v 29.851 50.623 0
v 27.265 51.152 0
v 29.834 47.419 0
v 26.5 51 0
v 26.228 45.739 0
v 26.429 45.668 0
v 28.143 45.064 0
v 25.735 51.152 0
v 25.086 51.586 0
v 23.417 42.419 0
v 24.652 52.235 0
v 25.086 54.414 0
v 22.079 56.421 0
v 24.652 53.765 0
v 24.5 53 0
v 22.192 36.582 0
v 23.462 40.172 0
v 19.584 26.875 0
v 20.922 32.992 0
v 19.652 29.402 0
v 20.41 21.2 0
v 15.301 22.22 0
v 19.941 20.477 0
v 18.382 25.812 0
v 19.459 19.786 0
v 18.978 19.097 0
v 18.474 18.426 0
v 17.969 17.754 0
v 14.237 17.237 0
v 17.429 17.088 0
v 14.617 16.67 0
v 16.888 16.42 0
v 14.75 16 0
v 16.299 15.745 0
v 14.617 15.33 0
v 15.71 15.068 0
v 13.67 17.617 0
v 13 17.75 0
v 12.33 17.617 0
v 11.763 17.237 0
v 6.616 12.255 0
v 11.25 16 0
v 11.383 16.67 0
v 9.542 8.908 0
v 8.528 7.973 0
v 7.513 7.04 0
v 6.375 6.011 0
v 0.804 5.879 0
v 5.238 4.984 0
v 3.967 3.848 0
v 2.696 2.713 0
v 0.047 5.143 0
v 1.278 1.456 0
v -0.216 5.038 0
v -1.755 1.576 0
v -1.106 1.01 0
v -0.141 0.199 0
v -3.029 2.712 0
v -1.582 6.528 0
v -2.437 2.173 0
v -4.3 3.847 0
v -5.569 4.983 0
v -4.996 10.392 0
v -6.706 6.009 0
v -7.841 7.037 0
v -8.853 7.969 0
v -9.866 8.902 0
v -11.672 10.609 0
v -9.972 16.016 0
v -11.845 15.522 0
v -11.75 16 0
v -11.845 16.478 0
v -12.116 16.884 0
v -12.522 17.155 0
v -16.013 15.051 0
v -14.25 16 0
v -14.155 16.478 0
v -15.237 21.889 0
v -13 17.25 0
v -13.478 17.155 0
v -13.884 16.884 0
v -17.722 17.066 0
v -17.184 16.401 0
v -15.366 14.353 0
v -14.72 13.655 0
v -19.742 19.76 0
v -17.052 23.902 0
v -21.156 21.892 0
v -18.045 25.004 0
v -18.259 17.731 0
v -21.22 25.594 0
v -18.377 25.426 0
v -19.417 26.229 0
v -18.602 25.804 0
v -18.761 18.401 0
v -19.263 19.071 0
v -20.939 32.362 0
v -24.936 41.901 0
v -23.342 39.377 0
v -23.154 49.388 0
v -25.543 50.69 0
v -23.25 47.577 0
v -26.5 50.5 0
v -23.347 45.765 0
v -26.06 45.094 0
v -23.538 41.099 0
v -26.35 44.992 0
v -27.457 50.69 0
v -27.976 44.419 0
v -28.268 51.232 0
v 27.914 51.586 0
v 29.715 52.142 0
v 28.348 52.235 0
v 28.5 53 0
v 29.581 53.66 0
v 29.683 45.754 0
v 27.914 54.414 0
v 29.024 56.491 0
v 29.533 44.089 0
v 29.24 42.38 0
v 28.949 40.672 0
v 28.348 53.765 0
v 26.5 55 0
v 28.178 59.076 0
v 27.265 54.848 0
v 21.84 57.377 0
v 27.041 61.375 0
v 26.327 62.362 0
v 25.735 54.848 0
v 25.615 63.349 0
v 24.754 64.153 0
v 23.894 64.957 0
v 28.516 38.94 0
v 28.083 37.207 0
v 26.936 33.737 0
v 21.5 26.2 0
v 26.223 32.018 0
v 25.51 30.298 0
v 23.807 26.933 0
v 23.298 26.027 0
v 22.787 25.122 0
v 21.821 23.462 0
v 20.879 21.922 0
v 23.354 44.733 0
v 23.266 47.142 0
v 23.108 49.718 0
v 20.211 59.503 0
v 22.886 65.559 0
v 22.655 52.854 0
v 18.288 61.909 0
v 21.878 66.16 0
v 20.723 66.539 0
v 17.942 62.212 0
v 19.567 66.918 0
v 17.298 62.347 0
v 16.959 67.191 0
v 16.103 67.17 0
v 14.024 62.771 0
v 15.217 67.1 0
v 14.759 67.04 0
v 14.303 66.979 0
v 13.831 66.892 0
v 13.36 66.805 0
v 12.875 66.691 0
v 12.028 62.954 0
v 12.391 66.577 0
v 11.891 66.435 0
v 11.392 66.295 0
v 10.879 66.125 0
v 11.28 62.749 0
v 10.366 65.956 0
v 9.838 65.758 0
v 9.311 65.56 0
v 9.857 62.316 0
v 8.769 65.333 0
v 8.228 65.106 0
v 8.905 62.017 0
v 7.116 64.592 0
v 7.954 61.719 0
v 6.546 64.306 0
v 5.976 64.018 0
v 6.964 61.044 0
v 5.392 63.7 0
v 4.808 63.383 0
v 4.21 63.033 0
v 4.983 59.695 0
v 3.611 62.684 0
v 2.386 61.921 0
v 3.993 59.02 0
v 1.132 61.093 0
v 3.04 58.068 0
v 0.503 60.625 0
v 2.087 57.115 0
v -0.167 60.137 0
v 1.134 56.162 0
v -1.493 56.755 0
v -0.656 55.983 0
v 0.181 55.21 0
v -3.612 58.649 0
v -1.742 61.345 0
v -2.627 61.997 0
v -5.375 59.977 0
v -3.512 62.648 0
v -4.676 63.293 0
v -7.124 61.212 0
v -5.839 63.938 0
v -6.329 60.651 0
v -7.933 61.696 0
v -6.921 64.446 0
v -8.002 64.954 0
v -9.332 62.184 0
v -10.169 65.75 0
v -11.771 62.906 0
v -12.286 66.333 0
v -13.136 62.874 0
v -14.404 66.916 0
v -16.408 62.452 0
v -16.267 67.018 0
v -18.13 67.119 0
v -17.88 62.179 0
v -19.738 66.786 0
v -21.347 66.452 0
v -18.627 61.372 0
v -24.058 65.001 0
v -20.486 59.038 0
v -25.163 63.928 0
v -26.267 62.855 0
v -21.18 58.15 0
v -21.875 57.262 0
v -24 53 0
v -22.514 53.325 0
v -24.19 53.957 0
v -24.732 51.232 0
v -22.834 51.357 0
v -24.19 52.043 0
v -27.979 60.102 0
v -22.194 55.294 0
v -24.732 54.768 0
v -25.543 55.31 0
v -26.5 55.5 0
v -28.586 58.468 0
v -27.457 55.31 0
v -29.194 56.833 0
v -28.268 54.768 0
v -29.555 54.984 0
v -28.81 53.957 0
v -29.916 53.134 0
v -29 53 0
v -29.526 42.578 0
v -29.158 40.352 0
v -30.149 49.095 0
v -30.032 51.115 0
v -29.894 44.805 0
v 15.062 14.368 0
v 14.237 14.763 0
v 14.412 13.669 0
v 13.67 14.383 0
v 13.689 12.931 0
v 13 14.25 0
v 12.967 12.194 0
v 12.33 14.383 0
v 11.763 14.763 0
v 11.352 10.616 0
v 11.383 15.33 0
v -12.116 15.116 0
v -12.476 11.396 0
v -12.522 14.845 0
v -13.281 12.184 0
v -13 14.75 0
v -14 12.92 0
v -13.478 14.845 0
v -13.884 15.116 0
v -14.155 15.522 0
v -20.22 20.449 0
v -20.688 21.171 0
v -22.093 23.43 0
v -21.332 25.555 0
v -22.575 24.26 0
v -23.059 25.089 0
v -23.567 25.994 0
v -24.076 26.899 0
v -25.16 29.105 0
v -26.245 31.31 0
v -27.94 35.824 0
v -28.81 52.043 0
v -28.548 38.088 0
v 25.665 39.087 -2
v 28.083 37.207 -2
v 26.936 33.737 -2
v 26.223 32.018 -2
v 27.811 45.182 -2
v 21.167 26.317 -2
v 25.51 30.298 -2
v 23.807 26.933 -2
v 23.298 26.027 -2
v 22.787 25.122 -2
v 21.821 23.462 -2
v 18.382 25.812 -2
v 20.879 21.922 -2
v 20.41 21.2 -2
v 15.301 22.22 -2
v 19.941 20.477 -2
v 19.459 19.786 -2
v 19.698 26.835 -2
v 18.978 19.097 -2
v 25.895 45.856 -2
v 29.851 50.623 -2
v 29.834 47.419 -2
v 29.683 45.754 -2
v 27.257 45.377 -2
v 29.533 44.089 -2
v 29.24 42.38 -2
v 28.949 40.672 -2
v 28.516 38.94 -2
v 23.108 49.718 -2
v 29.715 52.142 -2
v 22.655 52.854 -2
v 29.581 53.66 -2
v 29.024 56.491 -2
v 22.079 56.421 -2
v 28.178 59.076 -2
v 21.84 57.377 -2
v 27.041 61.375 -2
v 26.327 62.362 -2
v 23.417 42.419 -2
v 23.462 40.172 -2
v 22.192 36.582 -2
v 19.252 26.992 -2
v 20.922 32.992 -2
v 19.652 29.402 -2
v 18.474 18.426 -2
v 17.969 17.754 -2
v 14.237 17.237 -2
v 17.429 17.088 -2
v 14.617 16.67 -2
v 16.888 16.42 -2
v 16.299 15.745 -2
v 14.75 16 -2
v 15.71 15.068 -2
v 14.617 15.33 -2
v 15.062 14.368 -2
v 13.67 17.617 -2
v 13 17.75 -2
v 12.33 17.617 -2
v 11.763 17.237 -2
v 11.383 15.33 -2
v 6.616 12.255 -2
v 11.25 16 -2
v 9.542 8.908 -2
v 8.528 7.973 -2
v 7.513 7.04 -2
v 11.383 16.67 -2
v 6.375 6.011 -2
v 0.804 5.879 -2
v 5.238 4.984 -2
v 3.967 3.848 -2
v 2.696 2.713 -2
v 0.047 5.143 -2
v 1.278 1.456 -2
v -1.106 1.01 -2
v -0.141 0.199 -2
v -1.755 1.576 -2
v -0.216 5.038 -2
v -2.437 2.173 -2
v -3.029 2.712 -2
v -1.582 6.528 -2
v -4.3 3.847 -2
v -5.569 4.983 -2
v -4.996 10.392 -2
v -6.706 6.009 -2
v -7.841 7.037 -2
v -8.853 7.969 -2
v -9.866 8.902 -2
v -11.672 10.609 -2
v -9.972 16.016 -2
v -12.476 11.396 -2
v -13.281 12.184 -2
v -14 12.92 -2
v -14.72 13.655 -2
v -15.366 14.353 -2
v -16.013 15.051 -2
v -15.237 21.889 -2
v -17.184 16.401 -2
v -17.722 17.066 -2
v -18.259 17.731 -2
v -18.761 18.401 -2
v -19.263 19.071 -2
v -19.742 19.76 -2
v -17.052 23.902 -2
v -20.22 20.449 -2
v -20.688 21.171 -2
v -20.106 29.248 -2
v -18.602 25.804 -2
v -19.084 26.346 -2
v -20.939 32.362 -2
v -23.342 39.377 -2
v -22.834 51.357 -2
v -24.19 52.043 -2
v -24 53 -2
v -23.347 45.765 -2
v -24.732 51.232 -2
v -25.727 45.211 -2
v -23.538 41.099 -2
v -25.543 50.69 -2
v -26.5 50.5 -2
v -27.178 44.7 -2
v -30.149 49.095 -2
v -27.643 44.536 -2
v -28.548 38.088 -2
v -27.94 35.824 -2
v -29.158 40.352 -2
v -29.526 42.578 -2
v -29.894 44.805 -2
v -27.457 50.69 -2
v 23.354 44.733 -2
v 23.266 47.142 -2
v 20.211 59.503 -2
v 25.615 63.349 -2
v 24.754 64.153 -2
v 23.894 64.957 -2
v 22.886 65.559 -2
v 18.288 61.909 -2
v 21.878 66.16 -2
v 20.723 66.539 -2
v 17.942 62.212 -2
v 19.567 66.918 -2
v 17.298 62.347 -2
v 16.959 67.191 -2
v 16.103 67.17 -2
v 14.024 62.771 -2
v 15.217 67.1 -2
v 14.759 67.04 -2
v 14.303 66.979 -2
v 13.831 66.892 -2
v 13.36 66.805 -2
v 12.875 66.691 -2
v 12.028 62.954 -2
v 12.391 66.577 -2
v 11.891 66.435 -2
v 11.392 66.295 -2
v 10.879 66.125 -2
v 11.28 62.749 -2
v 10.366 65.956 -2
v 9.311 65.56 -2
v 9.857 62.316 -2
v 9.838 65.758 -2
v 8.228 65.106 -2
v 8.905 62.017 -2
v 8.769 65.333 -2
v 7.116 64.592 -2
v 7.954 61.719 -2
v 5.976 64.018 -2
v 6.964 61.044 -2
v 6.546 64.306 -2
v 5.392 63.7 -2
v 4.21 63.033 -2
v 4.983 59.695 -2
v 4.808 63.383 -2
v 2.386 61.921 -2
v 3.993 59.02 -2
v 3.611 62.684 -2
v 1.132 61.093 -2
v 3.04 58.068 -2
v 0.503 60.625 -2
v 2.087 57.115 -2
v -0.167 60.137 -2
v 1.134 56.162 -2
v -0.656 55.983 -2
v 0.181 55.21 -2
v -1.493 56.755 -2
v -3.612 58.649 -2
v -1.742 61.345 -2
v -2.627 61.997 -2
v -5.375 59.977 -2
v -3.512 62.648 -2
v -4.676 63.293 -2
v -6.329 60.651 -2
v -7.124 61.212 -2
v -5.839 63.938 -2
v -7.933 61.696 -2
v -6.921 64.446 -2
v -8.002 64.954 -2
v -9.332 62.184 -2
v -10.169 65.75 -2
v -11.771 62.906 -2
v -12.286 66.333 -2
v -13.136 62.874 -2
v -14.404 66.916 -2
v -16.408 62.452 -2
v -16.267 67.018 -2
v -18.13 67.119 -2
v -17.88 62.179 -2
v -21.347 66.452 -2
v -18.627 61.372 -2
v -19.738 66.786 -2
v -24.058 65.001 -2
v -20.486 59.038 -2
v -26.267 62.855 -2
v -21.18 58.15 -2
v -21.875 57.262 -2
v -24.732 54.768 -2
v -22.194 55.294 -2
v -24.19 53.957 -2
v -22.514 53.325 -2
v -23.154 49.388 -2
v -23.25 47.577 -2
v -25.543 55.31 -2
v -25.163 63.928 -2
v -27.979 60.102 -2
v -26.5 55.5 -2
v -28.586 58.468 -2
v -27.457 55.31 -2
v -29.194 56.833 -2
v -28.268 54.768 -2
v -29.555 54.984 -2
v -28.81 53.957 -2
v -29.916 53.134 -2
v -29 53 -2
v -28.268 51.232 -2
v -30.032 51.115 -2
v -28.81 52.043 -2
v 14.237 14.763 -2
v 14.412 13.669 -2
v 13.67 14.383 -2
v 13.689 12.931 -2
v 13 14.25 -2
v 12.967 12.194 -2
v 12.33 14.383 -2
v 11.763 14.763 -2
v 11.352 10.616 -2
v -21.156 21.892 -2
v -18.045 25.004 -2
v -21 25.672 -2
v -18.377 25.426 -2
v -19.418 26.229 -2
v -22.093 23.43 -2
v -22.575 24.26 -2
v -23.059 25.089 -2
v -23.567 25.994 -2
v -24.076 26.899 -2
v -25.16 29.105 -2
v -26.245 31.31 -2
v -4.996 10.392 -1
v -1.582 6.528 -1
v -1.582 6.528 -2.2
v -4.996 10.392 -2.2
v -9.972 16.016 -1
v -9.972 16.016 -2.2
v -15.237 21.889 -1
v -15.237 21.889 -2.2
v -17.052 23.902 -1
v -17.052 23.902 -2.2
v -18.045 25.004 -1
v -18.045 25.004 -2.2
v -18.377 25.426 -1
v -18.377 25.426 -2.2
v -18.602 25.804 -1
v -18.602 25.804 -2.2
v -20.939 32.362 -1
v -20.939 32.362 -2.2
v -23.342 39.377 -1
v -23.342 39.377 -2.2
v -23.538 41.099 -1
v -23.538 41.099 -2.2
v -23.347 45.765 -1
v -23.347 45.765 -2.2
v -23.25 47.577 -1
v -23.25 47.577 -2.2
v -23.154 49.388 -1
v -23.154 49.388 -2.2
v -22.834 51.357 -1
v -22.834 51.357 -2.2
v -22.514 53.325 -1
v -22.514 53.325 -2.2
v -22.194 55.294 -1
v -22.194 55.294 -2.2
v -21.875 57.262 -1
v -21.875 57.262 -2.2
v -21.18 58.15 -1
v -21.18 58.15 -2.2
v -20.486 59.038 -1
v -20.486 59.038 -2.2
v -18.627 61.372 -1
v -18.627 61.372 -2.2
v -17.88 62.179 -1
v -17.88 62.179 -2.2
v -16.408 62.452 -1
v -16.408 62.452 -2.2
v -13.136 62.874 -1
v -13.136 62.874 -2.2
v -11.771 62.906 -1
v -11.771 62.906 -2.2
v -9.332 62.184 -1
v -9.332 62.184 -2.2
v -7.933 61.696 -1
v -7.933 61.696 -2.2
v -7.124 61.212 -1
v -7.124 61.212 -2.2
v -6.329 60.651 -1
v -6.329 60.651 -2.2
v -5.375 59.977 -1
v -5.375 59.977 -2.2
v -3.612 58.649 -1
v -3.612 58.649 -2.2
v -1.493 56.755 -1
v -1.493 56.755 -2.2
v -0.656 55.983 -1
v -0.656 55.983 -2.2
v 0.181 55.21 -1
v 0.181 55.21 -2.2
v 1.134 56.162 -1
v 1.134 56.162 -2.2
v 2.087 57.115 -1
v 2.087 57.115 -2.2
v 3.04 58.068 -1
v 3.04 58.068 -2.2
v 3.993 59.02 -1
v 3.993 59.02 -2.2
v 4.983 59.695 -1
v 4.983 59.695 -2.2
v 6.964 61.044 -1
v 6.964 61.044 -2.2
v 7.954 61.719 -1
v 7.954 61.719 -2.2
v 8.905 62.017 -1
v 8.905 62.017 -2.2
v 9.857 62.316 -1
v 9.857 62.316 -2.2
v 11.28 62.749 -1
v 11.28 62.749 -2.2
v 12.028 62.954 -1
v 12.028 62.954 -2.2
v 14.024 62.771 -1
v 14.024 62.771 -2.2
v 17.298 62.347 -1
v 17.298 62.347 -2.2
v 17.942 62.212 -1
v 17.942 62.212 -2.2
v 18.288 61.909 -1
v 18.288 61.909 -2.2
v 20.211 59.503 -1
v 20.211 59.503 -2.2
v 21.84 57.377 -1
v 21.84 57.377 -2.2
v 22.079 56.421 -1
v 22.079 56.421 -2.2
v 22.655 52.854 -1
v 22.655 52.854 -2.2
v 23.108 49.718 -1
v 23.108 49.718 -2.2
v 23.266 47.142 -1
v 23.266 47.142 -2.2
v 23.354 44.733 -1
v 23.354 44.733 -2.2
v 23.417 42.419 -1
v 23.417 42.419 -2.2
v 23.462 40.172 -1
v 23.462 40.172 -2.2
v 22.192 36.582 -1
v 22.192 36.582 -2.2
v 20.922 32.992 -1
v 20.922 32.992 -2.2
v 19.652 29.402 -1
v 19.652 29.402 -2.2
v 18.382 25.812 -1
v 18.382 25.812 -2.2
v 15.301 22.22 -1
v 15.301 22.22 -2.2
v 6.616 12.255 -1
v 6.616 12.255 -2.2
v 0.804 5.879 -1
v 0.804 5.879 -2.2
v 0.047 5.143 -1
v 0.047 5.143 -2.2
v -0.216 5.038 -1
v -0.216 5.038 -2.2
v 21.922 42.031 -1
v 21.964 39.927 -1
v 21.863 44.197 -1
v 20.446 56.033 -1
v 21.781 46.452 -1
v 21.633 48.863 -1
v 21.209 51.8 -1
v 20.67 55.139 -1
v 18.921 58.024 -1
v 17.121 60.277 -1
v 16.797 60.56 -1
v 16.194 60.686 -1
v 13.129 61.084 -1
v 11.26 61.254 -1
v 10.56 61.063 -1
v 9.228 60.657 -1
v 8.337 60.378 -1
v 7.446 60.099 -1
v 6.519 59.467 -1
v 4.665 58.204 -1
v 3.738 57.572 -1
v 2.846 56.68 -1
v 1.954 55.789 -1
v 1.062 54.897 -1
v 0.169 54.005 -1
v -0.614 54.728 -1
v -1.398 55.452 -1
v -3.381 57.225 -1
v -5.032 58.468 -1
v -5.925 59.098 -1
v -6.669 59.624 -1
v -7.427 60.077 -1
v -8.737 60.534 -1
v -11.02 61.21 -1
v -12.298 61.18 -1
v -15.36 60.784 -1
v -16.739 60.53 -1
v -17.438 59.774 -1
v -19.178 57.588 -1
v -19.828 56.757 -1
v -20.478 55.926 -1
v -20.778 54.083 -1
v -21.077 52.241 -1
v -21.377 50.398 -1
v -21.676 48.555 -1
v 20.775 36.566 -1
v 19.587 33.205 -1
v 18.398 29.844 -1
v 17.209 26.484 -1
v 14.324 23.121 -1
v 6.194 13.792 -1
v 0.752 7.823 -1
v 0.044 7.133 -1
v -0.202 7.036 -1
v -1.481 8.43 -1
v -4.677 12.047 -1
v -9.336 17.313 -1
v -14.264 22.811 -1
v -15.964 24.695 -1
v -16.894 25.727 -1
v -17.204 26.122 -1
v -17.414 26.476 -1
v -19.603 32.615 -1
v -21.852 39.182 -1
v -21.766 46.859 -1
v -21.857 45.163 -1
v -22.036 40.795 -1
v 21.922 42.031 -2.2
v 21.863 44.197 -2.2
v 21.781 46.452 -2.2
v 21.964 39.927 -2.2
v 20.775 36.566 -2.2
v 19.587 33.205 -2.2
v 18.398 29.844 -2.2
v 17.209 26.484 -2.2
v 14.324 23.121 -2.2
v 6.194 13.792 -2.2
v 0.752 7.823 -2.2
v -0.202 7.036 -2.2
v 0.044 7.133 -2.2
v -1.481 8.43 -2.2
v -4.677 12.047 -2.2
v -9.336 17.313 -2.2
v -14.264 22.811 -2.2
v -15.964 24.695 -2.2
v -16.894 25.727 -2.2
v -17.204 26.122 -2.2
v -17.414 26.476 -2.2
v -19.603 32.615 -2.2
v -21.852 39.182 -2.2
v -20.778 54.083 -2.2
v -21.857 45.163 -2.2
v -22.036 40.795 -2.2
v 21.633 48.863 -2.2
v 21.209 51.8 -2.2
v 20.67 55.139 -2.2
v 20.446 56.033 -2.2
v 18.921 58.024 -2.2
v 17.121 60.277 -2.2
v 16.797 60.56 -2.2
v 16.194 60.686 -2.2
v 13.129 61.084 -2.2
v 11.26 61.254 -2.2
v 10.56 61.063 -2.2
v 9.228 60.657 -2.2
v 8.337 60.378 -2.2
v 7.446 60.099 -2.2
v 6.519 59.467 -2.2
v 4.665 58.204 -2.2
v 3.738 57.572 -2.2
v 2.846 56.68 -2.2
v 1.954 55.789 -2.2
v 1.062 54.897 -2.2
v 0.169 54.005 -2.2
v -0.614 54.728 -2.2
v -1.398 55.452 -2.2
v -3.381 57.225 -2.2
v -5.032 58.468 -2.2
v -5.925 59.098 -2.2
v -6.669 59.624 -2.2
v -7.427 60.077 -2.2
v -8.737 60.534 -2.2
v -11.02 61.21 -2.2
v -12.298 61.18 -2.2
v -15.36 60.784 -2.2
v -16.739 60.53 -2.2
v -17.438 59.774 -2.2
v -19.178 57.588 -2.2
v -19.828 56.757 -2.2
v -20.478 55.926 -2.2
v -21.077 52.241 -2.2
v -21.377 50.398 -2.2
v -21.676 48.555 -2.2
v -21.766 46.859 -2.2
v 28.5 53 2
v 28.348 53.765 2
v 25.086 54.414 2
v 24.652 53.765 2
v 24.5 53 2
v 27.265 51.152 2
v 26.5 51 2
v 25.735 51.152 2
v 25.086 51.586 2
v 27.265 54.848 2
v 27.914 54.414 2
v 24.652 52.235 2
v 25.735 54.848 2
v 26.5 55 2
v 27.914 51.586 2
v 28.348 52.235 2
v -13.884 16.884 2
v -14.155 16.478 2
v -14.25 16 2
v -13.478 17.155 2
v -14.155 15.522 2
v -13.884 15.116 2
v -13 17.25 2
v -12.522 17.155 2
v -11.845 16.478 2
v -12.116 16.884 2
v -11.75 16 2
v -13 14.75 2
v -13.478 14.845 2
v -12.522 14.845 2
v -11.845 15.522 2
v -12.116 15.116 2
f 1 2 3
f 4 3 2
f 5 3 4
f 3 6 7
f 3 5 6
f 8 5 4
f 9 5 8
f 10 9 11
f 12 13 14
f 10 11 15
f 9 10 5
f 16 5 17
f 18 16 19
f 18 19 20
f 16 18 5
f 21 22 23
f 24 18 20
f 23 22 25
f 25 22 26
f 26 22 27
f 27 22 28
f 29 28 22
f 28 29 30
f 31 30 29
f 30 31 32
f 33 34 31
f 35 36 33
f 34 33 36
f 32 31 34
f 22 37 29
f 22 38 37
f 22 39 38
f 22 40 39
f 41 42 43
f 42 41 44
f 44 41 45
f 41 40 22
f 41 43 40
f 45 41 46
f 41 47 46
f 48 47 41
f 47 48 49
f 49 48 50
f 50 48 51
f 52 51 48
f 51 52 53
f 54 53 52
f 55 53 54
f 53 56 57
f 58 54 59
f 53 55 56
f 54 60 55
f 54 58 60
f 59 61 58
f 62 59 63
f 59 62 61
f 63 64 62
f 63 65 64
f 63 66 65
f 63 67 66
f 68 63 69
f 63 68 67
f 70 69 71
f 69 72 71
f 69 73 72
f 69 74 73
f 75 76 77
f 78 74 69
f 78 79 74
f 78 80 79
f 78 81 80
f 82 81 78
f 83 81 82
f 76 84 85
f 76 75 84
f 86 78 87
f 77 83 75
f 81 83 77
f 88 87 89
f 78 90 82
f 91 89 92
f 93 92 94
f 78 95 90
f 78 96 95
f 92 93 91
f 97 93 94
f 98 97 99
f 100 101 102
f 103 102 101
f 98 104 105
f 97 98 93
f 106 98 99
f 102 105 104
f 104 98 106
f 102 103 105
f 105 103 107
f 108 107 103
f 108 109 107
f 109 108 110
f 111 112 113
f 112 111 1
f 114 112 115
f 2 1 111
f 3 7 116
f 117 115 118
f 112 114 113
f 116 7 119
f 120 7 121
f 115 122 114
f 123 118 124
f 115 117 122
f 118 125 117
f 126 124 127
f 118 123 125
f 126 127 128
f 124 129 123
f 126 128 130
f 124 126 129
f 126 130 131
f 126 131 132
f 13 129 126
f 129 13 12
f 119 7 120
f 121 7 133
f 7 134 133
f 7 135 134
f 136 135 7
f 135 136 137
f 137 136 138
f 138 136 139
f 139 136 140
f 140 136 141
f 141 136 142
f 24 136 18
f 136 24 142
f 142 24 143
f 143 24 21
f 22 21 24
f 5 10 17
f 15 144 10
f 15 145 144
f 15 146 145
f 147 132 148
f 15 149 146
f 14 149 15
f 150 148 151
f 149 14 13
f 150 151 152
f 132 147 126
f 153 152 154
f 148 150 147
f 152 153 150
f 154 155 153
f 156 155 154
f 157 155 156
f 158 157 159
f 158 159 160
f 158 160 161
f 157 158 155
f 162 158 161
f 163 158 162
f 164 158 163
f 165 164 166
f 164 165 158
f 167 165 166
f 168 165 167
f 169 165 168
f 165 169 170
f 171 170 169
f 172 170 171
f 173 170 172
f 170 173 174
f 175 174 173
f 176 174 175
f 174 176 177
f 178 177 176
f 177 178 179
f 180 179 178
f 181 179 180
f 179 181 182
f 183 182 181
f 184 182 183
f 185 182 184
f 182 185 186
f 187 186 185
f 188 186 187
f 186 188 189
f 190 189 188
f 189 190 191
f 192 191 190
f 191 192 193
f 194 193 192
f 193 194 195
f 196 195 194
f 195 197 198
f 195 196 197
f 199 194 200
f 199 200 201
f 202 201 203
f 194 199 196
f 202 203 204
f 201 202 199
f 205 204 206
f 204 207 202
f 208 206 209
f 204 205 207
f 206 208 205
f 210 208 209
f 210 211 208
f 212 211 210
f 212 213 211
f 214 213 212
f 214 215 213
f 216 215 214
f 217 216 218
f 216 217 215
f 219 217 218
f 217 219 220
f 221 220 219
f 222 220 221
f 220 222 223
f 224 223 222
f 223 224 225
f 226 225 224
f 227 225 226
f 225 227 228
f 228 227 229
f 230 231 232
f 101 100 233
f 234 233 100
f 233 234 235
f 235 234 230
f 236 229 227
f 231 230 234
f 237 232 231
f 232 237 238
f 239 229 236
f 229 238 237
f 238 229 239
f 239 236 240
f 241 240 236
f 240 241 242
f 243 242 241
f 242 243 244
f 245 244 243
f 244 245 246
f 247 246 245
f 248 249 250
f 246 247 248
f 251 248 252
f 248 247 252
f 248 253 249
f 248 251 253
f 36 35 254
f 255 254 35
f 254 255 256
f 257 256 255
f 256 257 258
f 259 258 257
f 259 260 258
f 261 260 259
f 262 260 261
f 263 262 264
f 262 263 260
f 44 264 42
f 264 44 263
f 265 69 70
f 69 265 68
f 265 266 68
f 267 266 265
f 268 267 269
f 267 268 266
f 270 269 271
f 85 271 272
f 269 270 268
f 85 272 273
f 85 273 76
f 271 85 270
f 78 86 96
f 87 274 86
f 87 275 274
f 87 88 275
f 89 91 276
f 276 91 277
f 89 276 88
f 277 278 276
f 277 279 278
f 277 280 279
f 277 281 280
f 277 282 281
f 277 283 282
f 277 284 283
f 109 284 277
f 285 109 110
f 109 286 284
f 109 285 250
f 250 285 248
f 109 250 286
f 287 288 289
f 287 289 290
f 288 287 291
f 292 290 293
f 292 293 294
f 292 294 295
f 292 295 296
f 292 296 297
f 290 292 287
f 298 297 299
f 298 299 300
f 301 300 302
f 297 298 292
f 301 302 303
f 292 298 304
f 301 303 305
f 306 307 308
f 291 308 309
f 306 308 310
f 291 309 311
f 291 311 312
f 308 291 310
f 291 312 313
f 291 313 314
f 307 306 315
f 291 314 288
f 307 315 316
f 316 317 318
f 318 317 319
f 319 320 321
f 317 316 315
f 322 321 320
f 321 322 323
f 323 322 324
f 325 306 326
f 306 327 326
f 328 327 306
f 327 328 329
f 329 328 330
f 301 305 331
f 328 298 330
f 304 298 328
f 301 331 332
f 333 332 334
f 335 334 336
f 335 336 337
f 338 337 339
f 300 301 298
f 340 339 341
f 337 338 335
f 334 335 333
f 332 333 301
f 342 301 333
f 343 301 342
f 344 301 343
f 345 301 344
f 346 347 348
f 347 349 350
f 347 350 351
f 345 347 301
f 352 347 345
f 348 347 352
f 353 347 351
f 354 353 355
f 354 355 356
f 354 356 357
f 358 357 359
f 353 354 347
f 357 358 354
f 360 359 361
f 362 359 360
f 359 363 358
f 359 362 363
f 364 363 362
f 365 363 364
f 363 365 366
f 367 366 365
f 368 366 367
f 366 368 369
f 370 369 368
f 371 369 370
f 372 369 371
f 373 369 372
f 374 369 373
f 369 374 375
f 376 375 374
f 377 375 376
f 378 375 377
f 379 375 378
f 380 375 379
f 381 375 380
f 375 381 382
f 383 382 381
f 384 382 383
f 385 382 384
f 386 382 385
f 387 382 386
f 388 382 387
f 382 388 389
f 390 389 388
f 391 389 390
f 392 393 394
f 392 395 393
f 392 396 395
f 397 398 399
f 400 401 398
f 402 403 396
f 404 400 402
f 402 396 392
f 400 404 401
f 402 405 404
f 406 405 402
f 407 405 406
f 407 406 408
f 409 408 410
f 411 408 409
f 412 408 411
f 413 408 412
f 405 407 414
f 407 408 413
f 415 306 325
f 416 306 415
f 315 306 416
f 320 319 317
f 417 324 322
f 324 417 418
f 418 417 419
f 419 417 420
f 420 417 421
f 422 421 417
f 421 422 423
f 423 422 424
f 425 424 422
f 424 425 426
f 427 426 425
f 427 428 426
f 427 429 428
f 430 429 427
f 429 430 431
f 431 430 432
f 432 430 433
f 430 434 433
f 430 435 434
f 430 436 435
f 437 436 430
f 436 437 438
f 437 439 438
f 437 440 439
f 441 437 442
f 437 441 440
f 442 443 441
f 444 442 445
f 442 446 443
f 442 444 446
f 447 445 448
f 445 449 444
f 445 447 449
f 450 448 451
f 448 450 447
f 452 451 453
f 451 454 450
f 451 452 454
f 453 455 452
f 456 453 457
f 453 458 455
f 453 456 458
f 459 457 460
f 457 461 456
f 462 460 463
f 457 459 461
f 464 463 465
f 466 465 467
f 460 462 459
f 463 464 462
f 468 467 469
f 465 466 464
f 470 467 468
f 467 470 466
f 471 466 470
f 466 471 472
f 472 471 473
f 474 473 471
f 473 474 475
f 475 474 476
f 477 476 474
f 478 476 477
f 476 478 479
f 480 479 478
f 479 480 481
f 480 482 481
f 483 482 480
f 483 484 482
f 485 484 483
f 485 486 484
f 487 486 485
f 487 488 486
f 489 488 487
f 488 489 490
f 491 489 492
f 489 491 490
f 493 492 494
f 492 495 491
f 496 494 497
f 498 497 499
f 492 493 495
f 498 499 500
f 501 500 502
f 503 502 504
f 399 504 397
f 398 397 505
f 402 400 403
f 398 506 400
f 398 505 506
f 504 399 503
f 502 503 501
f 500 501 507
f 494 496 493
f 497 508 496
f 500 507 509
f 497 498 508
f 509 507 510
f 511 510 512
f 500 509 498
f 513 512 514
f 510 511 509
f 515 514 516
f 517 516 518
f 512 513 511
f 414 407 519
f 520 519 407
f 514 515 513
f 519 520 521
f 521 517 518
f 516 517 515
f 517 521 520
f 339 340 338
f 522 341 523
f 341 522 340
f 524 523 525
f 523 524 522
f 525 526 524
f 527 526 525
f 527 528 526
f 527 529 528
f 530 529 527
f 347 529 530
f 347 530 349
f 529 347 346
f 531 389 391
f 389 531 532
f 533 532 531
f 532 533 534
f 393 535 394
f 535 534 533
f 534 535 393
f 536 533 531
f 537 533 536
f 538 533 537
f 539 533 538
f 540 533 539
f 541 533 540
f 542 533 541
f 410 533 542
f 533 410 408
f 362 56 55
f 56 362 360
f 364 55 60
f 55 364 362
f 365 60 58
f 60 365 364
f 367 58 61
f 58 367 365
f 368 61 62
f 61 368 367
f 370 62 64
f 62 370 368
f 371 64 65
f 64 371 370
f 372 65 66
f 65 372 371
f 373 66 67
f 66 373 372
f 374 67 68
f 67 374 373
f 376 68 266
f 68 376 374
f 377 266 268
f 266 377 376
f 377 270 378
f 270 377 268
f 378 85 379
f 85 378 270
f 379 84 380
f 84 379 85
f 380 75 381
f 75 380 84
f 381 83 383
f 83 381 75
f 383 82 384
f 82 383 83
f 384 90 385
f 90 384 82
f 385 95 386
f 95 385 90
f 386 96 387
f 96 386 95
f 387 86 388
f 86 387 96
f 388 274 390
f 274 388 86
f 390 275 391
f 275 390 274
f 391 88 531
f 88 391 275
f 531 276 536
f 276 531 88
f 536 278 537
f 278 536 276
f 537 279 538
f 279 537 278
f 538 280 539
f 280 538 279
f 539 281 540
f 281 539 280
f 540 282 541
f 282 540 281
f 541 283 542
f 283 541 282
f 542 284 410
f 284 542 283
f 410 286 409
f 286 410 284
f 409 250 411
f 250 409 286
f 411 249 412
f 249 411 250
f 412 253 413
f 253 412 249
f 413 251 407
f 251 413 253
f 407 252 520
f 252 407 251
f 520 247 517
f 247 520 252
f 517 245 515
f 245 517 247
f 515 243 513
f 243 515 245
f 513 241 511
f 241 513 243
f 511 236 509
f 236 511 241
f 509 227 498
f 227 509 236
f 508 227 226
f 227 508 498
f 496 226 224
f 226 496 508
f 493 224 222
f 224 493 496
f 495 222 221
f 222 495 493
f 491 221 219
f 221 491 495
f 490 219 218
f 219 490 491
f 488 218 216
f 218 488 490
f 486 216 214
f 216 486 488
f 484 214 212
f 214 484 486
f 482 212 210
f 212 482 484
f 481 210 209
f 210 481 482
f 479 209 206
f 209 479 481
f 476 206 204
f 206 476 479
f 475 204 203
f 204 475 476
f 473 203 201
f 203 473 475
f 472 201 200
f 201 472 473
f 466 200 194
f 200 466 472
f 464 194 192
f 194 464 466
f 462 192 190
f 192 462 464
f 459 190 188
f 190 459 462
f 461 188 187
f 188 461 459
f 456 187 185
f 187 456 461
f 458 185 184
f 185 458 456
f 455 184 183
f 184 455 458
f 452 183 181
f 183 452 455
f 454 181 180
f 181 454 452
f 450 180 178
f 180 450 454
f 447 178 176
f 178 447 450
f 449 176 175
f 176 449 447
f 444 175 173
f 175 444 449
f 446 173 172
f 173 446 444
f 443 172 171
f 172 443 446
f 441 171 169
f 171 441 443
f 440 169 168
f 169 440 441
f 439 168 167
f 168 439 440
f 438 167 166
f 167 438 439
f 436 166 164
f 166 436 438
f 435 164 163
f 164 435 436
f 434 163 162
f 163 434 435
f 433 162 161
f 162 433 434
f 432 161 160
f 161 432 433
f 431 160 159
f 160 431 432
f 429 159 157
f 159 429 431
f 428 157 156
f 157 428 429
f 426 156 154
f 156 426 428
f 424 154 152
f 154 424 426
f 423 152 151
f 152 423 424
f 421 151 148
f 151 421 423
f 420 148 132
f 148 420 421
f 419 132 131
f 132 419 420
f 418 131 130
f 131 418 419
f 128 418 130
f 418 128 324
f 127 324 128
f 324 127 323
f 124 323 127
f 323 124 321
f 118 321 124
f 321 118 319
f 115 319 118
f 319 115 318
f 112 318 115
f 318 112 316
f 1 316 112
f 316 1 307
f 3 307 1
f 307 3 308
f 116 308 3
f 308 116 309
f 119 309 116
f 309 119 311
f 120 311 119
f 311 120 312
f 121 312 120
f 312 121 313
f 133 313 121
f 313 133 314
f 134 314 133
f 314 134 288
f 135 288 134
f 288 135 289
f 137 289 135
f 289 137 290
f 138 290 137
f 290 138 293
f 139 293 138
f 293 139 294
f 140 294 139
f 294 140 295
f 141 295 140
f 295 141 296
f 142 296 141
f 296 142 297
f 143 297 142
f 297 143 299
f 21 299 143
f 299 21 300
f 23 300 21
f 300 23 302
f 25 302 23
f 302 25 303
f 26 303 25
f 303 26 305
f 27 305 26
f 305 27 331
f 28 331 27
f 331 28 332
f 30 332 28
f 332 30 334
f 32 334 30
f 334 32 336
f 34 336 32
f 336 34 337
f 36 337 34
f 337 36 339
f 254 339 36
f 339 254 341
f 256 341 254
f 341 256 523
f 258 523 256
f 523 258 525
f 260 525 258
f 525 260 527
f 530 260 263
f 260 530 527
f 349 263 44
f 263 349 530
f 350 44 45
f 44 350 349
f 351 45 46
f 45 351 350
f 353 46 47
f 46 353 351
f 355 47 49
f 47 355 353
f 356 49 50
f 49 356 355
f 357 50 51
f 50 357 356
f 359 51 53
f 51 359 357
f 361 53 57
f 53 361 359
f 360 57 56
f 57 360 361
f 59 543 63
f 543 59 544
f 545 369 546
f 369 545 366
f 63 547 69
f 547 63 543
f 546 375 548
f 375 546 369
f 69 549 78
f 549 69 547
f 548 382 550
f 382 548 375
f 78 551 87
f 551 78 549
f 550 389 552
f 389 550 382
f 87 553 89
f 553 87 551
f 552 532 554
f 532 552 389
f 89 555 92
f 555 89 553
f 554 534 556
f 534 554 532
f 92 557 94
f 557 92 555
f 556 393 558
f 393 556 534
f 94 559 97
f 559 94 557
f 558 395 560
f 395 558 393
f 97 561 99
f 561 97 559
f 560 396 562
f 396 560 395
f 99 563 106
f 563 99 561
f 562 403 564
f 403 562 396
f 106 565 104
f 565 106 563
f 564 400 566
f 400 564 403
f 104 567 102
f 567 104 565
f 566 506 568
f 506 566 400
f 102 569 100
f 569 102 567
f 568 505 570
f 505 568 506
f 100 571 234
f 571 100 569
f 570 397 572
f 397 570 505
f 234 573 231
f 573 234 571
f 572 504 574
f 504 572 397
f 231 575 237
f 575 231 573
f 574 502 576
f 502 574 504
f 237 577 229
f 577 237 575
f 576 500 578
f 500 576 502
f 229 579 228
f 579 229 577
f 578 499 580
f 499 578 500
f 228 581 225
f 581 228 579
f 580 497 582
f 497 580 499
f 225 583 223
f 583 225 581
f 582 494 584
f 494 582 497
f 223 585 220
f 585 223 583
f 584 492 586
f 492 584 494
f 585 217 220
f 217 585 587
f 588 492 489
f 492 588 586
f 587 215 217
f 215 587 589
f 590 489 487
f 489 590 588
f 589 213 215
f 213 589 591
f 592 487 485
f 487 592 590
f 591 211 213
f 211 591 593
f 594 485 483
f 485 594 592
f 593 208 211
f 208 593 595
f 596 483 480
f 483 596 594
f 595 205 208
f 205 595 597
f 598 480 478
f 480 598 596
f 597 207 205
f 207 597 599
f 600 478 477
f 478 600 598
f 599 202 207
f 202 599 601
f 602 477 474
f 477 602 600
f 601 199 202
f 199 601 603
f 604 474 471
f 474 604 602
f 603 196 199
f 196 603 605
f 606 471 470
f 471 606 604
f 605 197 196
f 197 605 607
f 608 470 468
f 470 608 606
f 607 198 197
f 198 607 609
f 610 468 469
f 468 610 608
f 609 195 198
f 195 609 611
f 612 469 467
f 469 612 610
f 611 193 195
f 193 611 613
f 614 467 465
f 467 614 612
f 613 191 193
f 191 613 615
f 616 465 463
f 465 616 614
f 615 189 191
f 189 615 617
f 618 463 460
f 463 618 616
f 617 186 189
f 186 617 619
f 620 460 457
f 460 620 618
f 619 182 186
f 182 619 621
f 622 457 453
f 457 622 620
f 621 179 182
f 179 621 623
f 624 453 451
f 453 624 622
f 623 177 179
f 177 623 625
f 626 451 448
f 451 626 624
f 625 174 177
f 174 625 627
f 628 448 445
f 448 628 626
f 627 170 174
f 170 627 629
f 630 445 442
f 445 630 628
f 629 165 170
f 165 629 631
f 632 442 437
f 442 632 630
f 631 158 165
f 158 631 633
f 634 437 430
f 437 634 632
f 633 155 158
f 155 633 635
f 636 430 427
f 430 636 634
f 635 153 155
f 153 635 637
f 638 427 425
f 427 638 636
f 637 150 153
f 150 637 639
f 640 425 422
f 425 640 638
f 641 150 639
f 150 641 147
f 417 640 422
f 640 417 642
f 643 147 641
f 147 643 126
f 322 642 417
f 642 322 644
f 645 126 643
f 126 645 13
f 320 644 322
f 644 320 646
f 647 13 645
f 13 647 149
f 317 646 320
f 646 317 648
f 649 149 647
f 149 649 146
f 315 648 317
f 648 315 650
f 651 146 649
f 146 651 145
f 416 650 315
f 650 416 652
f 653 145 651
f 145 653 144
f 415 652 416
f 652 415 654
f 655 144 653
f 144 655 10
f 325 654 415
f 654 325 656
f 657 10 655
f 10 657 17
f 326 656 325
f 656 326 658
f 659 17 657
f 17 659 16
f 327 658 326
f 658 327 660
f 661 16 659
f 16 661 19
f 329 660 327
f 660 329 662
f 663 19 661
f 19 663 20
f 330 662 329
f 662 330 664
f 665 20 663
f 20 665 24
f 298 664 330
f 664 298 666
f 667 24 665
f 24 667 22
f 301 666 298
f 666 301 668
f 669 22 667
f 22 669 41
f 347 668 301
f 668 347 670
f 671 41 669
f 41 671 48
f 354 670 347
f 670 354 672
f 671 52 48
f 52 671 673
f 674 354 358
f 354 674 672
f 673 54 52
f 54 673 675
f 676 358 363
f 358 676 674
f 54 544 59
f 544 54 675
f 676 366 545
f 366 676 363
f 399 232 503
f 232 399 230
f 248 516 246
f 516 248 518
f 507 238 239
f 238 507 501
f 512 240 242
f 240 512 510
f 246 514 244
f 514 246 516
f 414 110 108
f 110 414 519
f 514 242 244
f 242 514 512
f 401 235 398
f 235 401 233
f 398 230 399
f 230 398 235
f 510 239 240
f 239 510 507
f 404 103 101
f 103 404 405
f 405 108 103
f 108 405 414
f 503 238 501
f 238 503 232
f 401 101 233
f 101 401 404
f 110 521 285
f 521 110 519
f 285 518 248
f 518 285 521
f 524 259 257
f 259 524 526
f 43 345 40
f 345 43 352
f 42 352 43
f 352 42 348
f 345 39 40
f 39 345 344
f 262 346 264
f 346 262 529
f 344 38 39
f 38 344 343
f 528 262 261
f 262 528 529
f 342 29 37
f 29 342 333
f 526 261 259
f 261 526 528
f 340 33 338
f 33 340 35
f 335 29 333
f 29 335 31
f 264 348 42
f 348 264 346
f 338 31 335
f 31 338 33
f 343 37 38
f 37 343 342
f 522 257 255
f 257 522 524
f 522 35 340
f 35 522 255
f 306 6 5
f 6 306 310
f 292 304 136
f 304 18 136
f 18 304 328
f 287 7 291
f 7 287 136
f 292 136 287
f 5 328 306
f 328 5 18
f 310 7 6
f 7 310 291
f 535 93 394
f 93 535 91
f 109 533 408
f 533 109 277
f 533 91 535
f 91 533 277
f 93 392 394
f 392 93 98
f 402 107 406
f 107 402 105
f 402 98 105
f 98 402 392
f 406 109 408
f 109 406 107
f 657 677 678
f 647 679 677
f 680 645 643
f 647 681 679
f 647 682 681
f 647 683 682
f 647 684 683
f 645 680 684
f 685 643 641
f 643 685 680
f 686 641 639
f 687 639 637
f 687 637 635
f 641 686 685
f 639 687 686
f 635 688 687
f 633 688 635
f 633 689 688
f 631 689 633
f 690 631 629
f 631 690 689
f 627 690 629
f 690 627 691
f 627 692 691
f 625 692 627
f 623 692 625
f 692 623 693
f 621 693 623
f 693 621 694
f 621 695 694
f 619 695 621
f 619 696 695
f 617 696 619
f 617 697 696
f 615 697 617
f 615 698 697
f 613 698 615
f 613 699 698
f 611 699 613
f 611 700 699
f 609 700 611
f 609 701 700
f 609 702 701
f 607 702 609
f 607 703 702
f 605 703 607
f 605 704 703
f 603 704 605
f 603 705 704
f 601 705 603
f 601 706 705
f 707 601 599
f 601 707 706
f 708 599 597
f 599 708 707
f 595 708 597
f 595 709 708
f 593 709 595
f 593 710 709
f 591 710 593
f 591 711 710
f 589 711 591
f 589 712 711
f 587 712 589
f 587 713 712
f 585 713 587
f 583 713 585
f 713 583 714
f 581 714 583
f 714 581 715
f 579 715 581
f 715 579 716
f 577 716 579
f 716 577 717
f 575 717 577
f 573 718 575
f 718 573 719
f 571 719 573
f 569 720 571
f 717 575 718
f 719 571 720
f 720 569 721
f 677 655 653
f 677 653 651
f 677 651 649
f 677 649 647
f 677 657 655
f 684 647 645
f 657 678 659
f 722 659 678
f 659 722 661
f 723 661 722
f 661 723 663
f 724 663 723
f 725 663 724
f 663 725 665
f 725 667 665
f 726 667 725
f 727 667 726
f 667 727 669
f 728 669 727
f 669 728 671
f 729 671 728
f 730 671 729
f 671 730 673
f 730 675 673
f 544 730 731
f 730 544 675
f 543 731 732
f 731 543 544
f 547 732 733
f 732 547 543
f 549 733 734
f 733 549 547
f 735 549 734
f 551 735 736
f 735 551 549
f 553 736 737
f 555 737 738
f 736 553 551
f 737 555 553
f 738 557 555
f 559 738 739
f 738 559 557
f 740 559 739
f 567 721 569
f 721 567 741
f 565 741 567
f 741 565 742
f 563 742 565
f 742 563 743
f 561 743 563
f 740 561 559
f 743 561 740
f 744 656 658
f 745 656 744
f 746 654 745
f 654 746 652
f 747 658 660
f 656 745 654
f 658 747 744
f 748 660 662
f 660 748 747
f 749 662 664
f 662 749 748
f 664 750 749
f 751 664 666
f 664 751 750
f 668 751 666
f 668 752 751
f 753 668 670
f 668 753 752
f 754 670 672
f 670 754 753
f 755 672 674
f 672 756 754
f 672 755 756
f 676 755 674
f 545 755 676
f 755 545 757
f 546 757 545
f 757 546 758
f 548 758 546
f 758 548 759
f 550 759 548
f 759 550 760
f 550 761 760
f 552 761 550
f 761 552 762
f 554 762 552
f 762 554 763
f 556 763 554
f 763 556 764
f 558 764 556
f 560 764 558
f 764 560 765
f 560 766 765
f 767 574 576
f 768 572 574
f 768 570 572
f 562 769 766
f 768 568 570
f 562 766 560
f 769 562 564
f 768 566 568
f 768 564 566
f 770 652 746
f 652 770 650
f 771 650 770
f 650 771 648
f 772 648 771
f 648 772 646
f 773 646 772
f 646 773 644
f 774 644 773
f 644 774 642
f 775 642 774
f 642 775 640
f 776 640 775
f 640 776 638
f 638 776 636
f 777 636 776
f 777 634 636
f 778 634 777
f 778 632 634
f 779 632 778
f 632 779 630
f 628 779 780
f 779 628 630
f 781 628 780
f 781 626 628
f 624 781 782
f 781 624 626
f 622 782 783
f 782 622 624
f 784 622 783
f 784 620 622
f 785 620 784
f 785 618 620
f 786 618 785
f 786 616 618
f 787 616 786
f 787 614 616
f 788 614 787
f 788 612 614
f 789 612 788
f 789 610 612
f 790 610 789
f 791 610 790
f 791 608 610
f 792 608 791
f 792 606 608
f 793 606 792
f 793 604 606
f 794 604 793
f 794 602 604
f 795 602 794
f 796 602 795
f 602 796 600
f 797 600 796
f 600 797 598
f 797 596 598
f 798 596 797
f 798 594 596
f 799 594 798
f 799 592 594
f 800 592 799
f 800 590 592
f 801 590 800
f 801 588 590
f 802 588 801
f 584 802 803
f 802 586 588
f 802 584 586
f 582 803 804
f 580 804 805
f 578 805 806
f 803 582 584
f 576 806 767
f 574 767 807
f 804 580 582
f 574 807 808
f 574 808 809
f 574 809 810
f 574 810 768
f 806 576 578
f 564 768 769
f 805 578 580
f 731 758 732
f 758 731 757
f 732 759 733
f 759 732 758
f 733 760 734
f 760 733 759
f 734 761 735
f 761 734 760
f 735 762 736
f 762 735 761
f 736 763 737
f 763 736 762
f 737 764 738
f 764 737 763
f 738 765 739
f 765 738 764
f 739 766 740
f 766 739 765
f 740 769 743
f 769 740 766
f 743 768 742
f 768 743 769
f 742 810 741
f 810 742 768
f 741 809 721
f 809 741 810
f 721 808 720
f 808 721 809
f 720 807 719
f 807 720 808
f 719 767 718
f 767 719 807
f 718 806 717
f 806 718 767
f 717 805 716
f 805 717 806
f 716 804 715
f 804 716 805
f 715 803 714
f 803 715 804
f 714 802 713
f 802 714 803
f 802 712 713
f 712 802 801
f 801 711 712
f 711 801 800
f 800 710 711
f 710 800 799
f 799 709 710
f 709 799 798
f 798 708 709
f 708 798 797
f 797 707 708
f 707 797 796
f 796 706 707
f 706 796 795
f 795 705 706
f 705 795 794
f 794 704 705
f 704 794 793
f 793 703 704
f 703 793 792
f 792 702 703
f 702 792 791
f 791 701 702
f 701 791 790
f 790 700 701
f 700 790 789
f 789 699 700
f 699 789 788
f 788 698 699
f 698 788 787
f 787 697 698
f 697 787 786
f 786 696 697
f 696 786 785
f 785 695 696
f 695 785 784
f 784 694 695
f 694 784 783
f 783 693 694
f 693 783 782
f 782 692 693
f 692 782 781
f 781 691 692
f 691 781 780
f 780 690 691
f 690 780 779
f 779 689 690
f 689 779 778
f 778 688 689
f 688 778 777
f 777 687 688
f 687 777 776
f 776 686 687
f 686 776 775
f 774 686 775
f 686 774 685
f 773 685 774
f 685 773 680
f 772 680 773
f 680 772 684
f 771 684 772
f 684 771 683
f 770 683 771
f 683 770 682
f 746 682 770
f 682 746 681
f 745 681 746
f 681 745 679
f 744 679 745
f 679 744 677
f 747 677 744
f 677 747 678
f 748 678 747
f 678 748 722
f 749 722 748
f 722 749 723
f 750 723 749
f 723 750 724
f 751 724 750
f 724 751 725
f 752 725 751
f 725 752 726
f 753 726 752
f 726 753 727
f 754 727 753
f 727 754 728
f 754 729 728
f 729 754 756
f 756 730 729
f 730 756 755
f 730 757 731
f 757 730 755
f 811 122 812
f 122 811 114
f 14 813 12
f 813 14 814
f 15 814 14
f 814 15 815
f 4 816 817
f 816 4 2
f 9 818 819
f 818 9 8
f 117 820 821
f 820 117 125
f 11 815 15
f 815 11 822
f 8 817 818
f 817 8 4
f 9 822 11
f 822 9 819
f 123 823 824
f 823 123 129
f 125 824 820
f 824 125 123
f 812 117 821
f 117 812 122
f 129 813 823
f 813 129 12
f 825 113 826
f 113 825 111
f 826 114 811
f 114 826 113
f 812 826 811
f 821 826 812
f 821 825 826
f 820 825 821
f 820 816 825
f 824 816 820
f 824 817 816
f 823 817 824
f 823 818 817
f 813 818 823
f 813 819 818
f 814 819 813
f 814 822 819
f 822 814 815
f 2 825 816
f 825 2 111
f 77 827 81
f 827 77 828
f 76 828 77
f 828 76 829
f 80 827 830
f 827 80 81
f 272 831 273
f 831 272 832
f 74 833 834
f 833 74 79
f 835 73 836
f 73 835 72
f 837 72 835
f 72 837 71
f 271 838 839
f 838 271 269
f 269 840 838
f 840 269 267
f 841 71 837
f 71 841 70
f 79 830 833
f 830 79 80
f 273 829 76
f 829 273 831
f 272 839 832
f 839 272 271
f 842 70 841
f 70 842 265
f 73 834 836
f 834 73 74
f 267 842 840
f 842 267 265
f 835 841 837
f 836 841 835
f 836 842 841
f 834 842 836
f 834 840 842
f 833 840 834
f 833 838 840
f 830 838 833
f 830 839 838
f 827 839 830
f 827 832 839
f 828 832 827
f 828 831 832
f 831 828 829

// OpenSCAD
rotate([0,180,0]) union() {
	difference() {
		translate([-30,0,0]) linear_extrude(2) resize([60,0,0],auto=true) import("outer_heart.dxf");
		translate([-23.5,5,0]) linear_extrude(2) resize([47,0,0],auto=true) import("inner_heart.dxf");
		translate([26.5,53,1]) cylinder(r=2.5,h=2,center=true,$fn=16);
		translate([-13,16,1]) cylinder(r=1.75,h=2,center=true,$fn=16);
		translate([-21.5,26.2,0]) rotate([0,10,19.4]) cube([2,20,3]);
		translate([19.5,26.2,-.5]) rotate([0,-10,-19.4]) cube([2,20,3]);
	}
	translate([0,0,1]) difference() {
		translate([-23.5,5,0]) linear_extrude(1.2) resize([47,0,0],auto=true) import("inner_heart.dxf");
		translate([-22,7,0]) linear_extrude(1.2) resize([44,0,0],auto=true) import("inner_heart.dxf");
	}
	translate([-26.5,53,-1]) cylinder(r=2,h=2,center=true,$fn=16);
	translate([13,16,-1]) cylinder(r=1.25,h=2,center=true,$fn=16);
}
